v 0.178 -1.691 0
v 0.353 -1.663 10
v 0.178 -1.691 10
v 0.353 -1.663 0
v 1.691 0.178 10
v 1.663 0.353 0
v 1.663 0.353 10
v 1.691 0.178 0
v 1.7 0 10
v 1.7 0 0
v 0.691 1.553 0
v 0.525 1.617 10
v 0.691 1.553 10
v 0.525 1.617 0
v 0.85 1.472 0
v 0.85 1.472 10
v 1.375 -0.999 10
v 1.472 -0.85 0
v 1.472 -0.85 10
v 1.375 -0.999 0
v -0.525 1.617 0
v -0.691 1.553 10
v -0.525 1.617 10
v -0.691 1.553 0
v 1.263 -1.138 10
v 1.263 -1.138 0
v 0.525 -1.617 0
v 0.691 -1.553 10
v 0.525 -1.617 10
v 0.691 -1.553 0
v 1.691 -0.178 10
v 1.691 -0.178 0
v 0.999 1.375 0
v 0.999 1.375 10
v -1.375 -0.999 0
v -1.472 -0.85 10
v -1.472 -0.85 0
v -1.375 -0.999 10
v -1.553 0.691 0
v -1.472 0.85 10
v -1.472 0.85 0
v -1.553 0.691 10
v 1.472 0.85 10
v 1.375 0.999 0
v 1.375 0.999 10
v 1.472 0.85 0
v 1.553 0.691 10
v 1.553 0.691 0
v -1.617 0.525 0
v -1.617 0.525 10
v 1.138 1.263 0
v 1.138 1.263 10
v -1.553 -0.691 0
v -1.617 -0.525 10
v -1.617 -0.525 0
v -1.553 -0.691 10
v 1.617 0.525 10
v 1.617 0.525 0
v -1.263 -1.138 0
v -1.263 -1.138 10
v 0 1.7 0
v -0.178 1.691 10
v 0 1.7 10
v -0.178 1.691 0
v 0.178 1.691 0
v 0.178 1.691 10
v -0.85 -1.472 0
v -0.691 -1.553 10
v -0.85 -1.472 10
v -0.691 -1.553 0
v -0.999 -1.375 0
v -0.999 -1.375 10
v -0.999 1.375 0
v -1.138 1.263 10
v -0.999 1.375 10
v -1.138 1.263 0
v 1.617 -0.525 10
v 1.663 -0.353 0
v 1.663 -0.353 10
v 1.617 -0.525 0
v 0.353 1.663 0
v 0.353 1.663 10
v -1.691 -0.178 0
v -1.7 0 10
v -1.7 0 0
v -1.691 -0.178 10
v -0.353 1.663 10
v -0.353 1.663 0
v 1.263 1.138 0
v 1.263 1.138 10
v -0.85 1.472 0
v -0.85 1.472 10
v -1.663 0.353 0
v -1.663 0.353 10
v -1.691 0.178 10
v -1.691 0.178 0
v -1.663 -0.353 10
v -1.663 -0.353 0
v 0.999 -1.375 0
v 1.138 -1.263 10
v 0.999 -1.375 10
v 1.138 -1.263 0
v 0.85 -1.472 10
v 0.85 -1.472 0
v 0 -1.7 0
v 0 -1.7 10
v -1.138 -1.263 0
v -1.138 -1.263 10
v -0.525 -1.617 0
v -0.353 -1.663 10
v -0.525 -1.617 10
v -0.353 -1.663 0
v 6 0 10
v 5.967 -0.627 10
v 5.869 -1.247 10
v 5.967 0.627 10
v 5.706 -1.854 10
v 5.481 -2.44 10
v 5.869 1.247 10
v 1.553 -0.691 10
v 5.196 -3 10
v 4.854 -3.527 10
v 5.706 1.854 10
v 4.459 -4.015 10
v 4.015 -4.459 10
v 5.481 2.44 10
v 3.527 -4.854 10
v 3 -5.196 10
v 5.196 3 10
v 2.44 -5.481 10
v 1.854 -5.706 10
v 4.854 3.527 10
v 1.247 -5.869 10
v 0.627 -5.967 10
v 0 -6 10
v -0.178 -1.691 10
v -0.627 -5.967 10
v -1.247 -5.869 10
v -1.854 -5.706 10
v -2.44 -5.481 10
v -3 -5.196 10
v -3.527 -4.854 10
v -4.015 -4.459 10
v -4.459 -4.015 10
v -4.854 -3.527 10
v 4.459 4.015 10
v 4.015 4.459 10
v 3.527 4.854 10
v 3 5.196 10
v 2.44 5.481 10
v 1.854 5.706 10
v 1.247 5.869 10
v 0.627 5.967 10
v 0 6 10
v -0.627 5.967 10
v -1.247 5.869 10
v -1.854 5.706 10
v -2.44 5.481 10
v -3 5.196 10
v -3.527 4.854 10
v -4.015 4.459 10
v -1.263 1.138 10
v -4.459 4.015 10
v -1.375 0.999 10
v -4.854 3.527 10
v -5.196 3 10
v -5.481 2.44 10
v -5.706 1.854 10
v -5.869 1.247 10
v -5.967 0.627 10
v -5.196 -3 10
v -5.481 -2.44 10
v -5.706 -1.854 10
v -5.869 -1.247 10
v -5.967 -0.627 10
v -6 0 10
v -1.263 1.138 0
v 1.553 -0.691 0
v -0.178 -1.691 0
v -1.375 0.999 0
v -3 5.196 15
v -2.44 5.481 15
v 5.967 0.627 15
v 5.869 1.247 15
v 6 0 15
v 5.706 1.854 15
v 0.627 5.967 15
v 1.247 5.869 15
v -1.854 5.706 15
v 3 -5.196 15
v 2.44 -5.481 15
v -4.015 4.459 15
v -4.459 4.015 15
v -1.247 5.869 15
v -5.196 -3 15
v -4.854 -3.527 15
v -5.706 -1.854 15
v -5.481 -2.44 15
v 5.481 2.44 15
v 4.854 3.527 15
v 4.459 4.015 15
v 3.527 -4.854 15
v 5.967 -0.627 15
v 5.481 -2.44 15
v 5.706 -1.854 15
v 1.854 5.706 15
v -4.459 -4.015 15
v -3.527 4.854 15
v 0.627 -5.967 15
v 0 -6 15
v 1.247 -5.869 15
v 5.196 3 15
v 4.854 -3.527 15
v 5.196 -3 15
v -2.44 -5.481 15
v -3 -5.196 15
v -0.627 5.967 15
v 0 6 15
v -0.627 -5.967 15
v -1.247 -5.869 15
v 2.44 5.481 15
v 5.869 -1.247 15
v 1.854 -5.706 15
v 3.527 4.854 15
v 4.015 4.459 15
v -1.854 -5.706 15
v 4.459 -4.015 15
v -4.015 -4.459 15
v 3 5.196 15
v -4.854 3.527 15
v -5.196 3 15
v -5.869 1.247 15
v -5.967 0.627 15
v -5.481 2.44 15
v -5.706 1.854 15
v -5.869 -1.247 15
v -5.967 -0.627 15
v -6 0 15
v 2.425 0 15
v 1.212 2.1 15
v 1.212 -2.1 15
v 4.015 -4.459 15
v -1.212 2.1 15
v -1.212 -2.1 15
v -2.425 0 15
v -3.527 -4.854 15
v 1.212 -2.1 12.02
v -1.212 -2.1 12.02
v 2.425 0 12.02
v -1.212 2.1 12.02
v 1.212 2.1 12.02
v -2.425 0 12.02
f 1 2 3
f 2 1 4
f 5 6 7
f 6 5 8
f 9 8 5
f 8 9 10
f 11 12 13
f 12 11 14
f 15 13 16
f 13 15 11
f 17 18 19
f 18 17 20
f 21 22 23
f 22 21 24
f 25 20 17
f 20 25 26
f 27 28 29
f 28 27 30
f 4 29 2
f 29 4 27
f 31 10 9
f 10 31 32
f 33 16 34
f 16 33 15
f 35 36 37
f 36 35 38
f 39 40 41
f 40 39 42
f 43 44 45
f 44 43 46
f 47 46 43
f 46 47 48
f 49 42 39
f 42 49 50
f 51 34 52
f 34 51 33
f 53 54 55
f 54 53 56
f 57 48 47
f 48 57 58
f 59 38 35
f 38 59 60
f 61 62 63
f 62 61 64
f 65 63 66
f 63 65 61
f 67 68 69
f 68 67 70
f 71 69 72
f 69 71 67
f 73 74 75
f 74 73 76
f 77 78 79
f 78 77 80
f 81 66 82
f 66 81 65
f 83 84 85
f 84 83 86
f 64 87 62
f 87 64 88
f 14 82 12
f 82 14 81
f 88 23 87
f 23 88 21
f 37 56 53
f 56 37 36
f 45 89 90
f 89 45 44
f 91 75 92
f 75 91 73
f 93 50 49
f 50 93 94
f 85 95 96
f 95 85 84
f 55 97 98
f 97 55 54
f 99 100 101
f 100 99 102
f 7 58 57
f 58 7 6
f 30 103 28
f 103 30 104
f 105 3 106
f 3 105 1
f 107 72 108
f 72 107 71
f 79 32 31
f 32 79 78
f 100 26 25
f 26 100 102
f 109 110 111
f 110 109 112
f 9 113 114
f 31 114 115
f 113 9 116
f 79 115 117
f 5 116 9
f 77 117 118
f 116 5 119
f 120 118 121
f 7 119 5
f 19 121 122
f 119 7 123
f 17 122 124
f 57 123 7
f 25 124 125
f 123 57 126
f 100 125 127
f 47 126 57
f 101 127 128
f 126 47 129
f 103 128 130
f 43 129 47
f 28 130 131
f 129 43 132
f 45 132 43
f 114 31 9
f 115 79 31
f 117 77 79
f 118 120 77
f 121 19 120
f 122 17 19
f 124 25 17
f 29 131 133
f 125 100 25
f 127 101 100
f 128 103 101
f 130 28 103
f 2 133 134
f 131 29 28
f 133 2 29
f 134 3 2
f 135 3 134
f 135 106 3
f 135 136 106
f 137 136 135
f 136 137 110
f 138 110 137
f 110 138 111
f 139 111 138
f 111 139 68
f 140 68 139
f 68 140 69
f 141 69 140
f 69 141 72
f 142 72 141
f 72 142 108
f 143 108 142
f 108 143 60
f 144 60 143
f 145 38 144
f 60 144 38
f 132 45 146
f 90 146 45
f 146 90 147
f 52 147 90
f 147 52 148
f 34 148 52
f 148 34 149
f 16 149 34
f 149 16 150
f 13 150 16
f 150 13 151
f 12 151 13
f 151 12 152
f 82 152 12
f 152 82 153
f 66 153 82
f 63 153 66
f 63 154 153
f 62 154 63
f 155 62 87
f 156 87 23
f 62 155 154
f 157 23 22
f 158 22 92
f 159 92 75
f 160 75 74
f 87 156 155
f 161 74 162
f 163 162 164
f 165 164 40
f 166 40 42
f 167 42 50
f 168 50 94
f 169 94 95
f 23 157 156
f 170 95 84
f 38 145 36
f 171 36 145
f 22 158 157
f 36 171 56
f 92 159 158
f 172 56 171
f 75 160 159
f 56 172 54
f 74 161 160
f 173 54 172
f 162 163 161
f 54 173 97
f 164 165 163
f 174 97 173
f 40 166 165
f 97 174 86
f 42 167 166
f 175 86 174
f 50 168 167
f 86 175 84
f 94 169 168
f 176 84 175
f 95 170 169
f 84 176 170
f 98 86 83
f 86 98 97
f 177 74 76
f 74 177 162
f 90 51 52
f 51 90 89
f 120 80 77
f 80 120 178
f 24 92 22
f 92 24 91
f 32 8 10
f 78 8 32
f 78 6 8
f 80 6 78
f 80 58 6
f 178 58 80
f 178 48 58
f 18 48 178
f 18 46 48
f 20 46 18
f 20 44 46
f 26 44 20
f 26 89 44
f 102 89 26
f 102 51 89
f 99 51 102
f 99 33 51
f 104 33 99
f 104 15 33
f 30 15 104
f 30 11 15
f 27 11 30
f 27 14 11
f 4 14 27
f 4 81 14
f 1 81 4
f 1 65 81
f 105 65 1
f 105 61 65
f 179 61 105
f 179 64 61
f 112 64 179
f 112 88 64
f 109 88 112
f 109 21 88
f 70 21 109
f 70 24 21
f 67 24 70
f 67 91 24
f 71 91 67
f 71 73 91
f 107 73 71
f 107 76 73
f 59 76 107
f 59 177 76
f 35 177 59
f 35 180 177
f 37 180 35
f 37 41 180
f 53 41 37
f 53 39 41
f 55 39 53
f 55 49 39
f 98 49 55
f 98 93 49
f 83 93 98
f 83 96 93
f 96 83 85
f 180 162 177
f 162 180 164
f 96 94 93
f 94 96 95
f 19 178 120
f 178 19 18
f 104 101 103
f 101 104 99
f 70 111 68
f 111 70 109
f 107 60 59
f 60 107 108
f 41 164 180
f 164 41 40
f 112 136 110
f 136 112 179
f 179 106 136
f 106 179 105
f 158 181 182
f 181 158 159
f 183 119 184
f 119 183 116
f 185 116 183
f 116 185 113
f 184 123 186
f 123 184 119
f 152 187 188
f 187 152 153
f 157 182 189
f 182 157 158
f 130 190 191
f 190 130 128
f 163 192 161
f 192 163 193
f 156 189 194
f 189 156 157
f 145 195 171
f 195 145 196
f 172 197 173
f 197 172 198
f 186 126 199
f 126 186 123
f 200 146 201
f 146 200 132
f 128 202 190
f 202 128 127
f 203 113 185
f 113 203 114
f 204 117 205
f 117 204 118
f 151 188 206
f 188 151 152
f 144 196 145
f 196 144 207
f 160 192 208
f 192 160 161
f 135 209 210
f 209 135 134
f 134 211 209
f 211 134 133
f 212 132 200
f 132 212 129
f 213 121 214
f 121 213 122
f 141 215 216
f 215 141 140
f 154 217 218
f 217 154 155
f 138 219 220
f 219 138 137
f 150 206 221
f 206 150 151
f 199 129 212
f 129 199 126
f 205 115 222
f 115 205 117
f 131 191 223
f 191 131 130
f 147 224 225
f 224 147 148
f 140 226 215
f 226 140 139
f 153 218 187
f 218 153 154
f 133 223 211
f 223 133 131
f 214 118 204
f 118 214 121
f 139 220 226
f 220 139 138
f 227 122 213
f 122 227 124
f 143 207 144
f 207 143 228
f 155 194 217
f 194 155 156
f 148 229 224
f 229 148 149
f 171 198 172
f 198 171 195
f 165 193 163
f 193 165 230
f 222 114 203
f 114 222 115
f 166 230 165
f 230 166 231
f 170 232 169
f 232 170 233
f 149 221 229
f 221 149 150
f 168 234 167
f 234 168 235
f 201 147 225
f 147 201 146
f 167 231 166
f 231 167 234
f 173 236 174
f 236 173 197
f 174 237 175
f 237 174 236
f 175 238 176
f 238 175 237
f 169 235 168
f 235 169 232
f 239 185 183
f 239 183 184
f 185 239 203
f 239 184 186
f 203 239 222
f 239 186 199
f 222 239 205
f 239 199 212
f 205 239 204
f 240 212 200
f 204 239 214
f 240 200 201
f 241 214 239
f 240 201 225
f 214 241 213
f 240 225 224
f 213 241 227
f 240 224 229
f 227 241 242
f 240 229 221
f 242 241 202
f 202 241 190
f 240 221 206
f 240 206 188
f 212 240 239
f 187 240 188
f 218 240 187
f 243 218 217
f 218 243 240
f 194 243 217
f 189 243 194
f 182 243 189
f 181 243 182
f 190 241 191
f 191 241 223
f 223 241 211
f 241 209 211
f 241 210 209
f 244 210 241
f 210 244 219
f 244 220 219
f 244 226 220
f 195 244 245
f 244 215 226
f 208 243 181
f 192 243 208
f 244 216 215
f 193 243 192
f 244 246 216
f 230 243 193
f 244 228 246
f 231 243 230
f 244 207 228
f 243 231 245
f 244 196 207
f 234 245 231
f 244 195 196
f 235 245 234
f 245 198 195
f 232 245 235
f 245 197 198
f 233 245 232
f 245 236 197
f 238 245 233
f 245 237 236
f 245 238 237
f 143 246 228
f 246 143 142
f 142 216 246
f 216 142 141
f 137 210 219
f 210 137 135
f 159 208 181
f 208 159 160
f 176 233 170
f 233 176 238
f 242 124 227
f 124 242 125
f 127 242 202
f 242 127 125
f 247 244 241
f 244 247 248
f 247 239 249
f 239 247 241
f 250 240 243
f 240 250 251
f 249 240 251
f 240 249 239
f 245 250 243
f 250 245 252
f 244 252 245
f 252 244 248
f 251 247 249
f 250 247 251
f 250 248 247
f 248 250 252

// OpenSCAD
// Thumb screw, smooth-shank representation.
$fn = 60;
eps = 0.02;
shaft_d = 3.4;
head_d = 12;
shaft_l = 10;
head_h = 5;
difference() {
    union() { cylinder(d = shaft_d, h = shaft_l); translate([0, 0, shaft_l]) cylinder(d = head_d, h = head_h); }
    translate([0, 0, shaft_l + head_h - 3 + eps]) cylinder(d = head_d * 0.35 / cos(30), h = 3 + eps, $fn = 6);
}
